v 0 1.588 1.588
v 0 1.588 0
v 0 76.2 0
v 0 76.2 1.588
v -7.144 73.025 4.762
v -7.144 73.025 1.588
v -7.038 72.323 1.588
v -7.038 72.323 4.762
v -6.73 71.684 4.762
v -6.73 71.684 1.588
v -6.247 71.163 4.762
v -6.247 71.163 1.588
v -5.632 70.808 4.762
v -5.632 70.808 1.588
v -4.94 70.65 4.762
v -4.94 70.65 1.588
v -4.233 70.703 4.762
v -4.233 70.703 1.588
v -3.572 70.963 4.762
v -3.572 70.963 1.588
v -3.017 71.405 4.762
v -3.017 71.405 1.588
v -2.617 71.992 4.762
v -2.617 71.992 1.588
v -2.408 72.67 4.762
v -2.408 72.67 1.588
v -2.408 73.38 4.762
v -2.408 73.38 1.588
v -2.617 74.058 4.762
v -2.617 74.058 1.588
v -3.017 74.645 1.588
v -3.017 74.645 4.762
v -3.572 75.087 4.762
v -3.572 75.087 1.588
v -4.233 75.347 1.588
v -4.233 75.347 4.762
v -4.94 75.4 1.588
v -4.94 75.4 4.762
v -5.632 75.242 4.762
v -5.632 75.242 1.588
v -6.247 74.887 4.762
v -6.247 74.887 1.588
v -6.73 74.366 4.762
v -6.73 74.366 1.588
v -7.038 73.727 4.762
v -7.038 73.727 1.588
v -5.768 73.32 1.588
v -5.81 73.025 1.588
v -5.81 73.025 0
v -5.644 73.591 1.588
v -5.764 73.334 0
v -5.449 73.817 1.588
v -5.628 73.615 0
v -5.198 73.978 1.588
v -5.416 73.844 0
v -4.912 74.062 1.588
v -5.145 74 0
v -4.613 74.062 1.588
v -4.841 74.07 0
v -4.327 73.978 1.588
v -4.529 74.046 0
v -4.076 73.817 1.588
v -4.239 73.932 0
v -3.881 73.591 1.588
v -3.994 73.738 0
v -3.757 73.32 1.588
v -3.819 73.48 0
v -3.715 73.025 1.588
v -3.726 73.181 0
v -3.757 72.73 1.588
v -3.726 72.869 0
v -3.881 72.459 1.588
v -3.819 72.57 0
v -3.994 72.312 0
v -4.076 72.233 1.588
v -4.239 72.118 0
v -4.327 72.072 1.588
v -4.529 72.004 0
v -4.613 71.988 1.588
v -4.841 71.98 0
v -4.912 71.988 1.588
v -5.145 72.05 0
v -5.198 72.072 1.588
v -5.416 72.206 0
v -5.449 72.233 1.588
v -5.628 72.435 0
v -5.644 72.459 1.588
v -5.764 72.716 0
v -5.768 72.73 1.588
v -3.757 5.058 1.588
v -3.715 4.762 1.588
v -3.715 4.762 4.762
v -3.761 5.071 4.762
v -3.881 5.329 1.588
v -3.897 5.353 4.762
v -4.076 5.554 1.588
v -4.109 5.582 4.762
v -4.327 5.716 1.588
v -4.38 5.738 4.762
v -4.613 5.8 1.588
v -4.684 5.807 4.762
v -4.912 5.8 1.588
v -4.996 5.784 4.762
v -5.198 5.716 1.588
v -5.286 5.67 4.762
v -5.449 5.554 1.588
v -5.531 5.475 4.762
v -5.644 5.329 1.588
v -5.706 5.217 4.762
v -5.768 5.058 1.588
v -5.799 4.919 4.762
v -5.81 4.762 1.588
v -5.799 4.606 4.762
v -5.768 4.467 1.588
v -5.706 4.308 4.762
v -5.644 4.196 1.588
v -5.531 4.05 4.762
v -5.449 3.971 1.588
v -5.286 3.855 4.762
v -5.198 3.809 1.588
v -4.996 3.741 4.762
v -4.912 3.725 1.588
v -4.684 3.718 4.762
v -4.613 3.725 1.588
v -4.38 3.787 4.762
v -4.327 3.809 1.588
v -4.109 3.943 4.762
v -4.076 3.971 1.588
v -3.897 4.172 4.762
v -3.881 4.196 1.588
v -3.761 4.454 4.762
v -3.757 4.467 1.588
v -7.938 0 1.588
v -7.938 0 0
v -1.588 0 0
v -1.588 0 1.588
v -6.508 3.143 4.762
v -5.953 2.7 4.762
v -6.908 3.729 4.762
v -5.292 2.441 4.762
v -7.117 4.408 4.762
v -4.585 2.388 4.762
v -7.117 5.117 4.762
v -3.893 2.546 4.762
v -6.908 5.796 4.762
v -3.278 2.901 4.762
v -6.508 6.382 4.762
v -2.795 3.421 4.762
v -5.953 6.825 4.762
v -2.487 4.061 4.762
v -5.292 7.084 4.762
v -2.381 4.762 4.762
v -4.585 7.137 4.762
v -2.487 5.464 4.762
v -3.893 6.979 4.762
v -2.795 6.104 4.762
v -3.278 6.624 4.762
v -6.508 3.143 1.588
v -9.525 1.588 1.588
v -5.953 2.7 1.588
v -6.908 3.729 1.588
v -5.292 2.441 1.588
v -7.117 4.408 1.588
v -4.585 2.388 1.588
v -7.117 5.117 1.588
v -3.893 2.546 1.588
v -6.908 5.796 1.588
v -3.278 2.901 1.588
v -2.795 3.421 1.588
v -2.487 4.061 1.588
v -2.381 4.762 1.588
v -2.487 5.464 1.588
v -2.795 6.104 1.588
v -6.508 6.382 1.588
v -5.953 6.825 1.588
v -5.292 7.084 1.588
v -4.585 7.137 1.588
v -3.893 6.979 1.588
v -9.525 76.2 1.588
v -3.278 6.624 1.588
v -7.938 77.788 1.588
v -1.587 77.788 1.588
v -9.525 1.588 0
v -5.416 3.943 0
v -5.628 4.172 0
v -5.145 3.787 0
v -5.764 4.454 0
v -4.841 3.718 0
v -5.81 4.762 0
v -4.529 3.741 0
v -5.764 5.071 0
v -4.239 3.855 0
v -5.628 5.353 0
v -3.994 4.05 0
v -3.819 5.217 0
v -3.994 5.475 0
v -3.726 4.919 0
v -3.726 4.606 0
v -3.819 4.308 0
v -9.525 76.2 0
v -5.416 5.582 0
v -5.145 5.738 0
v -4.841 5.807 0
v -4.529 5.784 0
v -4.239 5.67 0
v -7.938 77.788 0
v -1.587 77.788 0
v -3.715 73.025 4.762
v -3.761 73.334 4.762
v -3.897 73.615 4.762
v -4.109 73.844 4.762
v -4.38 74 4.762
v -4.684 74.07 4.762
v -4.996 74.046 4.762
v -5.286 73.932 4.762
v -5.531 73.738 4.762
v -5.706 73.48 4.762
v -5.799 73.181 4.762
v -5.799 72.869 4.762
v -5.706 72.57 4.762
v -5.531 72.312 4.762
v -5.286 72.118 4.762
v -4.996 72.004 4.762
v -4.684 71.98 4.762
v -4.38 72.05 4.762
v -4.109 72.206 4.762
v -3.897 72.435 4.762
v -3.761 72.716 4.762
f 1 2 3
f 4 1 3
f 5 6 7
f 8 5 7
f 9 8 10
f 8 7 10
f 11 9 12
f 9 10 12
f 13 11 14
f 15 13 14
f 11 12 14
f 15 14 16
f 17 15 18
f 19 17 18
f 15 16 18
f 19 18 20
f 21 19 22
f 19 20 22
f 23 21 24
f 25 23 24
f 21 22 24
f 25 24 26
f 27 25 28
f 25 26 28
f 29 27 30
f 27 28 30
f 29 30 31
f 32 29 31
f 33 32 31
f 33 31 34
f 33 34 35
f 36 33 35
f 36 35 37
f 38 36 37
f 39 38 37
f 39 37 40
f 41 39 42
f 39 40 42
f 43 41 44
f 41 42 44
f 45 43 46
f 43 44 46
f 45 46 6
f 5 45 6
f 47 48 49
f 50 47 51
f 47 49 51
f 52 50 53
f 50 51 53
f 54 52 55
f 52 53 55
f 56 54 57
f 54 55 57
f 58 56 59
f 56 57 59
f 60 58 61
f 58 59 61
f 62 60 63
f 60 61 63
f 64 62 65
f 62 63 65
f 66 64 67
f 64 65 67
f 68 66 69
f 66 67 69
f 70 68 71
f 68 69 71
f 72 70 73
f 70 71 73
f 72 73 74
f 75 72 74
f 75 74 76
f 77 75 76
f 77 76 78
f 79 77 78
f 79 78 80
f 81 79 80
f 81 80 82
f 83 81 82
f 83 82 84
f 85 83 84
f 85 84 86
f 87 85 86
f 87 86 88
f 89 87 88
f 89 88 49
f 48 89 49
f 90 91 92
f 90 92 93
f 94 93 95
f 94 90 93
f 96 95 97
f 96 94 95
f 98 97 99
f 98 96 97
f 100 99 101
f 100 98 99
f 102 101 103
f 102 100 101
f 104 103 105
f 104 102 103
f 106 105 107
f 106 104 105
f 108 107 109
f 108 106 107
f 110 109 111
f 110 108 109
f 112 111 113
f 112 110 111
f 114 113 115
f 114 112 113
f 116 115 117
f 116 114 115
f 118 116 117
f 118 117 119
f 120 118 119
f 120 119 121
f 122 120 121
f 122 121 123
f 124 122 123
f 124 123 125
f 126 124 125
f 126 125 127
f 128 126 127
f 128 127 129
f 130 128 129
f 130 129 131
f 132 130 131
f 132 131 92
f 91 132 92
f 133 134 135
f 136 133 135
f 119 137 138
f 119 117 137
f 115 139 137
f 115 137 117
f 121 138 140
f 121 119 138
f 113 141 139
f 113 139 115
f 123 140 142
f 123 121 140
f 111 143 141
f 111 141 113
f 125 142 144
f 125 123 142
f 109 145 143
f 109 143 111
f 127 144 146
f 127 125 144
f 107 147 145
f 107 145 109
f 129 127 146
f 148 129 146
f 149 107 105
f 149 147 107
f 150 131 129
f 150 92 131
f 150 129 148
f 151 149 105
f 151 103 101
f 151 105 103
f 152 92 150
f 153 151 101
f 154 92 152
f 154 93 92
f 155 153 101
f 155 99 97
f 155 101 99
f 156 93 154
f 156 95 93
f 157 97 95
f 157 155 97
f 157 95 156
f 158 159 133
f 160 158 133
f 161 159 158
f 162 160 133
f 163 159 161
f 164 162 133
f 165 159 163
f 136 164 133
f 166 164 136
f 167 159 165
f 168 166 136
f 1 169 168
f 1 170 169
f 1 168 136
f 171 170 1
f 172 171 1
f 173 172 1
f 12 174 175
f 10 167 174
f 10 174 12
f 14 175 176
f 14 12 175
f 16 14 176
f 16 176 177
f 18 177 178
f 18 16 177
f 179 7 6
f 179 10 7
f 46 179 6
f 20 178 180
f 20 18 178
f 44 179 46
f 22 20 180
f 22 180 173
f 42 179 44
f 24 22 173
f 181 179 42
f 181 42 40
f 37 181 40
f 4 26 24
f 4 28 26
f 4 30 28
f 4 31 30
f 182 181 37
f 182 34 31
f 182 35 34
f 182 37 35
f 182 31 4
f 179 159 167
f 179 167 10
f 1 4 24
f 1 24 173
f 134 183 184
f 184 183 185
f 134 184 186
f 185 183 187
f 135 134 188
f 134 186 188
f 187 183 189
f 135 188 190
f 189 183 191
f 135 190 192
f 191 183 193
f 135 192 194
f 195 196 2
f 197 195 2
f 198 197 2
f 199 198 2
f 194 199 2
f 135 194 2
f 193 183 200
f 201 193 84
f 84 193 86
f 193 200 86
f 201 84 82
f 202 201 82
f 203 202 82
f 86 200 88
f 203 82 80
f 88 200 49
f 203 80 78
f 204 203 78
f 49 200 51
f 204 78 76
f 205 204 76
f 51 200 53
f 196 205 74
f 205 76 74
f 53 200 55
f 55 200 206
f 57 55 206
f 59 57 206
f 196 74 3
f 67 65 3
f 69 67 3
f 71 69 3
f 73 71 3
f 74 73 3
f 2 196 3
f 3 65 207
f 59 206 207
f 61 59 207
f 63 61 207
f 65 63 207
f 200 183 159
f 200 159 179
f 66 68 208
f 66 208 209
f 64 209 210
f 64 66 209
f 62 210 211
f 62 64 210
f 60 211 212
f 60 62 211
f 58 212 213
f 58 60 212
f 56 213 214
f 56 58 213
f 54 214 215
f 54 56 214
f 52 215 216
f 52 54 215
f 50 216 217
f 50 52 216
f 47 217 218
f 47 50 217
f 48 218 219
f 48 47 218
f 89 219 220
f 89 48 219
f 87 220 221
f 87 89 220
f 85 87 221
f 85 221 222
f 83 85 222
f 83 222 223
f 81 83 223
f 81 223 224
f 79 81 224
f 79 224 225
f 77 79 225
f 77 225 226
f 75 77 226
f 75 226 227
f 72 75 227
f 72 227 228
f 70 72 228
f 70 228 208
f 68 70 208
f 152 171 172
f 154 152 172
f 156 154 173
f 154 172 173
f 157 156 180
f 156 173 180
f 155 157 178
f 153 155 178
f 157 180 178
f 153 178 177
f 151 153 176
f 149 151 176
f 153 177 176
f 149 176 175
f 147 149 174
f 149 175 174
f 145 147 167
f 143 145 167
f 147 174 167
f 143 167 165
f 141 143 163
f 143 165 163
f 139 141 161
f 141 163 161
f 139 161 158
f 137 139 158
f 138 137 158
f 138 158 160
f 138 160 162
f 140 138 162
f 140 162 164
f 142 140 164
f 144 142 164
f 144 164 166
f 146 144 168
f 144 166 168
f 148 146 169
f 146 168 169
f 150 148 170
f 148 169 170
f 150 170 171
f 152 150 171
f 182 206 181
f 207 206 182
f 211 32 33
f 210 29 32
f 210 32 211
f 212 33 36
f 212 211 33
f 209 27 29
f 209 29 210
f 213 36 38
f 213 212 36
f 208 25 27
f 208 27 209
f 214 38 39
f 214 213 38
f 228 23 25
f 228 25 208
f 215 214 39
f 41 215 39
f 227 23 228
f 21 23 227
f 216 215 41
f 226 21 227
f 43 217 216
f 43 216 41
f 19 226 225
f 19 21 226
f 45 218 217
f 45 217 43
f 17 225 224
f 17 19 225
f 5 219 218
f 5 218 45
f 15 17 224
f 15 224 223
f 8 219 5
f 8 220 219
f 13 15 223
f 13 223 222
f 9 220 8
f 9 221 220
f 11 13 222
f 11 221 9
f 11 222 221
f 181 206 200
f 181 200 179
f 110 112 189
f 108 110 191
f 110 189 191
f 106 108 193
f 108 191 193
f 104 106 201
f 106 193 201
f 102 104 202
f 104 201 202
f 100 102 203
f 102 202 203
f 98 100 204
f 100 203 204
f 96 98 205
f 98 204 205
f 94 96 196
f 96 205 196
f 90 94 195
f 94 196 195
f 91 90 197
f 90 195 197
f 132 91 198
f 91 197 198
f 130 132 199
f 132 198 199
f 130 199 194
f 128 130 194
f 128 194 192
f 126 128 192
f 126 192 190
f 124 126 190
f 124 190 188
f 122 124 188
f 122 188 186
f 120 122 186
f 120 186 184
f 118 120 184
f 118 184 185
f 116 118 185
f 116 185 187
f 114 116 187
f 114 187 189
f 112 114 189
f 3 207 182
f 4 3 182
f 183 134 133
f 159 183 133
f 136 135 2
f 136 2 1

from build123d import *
from build123d.topology import SkipClean

# Parameters (mm, degrees)
SKETCH1_W                    = 9.525
SKETCH1_H                    = 77.7875
BOSS_EXTRUDE1_DEPTH          = 1.5875
CHAMFER2_SIZE                = 1.5875
F_97_0_0825_DIAMETER_HOLE1_D = 2.0955
SKETCH5_R                    = 2.38125
SKETCH5_R_2                  = 1.04775
BOSS_EXTRUDE2_DEPTH          = 3.175


with BuildPart() as part:
    # Sketch1 → Boss-Extrude1 (new body)
    with BuildSketch(Plane.XY):
        with Locations((-4.7625, 38.89375)):
            Rectangle(SKETCH1_W, SKETCH1_H)
    extrude(amount=BOSS_EXTRUDE1_DEPTH)

    # Chamfer2
    chamfer2_edges = [part.edges().sort_by_distance(p)[0] for p in [
        (0, 77.7875, 0.79375),
        (-9.525, 77.7875, 0.79375),
        (0, 0, 0.79375),
        (-9.525, 0, 0.79375),
    ]]
    chamfer(chamfer2_edges, length=CHAMFER2_SIZE)

    # #97 (0.0825) Diameter Hole1 (through all)
    with Locations(Plane.XY.offset(1.5875)):
        with Locations((-4.7625, 4.7625), (-4.7625, 73.025)):
            Hole(F_97_0_0825_DIAMETER_HOLE1_D / 2)

    # Sketch5 → Boss-Extrude2 (add)
    # profile 1 of 2: a face of its own
    with SkipClean():  # the faces are left unmerged after this step: merging them gives an invalid solid
        with BuildSketch(Plane.XY.offset(1.5875)):
            with Locations((-4.7625, 4.7625)):
                Circle(SKETCH5_R)
            with Locations((-4.7625, 4.7625)):
                Circle(SKETCH5_R_2, mode=Mode.SUBTRACT)
        # profile 2 of 2: a face of its own
        with BuildSketch(Plane.XY.offset(1.5875)):
            with Locations((-4.7625, 73.025)):
                Circle(SKETCH5_R)
            with Locations((-4.7625, 73.025)):
                Circle(SKETCH5_R_2, mode=Mode.SUBTRACT)
        extrude(amount=BOSS_EXTRUDE2_DEPTH)
    add(part.part.scale(1), mode=Mode.REPLACE)  # the faces are merged on a copy


solid = part.part
